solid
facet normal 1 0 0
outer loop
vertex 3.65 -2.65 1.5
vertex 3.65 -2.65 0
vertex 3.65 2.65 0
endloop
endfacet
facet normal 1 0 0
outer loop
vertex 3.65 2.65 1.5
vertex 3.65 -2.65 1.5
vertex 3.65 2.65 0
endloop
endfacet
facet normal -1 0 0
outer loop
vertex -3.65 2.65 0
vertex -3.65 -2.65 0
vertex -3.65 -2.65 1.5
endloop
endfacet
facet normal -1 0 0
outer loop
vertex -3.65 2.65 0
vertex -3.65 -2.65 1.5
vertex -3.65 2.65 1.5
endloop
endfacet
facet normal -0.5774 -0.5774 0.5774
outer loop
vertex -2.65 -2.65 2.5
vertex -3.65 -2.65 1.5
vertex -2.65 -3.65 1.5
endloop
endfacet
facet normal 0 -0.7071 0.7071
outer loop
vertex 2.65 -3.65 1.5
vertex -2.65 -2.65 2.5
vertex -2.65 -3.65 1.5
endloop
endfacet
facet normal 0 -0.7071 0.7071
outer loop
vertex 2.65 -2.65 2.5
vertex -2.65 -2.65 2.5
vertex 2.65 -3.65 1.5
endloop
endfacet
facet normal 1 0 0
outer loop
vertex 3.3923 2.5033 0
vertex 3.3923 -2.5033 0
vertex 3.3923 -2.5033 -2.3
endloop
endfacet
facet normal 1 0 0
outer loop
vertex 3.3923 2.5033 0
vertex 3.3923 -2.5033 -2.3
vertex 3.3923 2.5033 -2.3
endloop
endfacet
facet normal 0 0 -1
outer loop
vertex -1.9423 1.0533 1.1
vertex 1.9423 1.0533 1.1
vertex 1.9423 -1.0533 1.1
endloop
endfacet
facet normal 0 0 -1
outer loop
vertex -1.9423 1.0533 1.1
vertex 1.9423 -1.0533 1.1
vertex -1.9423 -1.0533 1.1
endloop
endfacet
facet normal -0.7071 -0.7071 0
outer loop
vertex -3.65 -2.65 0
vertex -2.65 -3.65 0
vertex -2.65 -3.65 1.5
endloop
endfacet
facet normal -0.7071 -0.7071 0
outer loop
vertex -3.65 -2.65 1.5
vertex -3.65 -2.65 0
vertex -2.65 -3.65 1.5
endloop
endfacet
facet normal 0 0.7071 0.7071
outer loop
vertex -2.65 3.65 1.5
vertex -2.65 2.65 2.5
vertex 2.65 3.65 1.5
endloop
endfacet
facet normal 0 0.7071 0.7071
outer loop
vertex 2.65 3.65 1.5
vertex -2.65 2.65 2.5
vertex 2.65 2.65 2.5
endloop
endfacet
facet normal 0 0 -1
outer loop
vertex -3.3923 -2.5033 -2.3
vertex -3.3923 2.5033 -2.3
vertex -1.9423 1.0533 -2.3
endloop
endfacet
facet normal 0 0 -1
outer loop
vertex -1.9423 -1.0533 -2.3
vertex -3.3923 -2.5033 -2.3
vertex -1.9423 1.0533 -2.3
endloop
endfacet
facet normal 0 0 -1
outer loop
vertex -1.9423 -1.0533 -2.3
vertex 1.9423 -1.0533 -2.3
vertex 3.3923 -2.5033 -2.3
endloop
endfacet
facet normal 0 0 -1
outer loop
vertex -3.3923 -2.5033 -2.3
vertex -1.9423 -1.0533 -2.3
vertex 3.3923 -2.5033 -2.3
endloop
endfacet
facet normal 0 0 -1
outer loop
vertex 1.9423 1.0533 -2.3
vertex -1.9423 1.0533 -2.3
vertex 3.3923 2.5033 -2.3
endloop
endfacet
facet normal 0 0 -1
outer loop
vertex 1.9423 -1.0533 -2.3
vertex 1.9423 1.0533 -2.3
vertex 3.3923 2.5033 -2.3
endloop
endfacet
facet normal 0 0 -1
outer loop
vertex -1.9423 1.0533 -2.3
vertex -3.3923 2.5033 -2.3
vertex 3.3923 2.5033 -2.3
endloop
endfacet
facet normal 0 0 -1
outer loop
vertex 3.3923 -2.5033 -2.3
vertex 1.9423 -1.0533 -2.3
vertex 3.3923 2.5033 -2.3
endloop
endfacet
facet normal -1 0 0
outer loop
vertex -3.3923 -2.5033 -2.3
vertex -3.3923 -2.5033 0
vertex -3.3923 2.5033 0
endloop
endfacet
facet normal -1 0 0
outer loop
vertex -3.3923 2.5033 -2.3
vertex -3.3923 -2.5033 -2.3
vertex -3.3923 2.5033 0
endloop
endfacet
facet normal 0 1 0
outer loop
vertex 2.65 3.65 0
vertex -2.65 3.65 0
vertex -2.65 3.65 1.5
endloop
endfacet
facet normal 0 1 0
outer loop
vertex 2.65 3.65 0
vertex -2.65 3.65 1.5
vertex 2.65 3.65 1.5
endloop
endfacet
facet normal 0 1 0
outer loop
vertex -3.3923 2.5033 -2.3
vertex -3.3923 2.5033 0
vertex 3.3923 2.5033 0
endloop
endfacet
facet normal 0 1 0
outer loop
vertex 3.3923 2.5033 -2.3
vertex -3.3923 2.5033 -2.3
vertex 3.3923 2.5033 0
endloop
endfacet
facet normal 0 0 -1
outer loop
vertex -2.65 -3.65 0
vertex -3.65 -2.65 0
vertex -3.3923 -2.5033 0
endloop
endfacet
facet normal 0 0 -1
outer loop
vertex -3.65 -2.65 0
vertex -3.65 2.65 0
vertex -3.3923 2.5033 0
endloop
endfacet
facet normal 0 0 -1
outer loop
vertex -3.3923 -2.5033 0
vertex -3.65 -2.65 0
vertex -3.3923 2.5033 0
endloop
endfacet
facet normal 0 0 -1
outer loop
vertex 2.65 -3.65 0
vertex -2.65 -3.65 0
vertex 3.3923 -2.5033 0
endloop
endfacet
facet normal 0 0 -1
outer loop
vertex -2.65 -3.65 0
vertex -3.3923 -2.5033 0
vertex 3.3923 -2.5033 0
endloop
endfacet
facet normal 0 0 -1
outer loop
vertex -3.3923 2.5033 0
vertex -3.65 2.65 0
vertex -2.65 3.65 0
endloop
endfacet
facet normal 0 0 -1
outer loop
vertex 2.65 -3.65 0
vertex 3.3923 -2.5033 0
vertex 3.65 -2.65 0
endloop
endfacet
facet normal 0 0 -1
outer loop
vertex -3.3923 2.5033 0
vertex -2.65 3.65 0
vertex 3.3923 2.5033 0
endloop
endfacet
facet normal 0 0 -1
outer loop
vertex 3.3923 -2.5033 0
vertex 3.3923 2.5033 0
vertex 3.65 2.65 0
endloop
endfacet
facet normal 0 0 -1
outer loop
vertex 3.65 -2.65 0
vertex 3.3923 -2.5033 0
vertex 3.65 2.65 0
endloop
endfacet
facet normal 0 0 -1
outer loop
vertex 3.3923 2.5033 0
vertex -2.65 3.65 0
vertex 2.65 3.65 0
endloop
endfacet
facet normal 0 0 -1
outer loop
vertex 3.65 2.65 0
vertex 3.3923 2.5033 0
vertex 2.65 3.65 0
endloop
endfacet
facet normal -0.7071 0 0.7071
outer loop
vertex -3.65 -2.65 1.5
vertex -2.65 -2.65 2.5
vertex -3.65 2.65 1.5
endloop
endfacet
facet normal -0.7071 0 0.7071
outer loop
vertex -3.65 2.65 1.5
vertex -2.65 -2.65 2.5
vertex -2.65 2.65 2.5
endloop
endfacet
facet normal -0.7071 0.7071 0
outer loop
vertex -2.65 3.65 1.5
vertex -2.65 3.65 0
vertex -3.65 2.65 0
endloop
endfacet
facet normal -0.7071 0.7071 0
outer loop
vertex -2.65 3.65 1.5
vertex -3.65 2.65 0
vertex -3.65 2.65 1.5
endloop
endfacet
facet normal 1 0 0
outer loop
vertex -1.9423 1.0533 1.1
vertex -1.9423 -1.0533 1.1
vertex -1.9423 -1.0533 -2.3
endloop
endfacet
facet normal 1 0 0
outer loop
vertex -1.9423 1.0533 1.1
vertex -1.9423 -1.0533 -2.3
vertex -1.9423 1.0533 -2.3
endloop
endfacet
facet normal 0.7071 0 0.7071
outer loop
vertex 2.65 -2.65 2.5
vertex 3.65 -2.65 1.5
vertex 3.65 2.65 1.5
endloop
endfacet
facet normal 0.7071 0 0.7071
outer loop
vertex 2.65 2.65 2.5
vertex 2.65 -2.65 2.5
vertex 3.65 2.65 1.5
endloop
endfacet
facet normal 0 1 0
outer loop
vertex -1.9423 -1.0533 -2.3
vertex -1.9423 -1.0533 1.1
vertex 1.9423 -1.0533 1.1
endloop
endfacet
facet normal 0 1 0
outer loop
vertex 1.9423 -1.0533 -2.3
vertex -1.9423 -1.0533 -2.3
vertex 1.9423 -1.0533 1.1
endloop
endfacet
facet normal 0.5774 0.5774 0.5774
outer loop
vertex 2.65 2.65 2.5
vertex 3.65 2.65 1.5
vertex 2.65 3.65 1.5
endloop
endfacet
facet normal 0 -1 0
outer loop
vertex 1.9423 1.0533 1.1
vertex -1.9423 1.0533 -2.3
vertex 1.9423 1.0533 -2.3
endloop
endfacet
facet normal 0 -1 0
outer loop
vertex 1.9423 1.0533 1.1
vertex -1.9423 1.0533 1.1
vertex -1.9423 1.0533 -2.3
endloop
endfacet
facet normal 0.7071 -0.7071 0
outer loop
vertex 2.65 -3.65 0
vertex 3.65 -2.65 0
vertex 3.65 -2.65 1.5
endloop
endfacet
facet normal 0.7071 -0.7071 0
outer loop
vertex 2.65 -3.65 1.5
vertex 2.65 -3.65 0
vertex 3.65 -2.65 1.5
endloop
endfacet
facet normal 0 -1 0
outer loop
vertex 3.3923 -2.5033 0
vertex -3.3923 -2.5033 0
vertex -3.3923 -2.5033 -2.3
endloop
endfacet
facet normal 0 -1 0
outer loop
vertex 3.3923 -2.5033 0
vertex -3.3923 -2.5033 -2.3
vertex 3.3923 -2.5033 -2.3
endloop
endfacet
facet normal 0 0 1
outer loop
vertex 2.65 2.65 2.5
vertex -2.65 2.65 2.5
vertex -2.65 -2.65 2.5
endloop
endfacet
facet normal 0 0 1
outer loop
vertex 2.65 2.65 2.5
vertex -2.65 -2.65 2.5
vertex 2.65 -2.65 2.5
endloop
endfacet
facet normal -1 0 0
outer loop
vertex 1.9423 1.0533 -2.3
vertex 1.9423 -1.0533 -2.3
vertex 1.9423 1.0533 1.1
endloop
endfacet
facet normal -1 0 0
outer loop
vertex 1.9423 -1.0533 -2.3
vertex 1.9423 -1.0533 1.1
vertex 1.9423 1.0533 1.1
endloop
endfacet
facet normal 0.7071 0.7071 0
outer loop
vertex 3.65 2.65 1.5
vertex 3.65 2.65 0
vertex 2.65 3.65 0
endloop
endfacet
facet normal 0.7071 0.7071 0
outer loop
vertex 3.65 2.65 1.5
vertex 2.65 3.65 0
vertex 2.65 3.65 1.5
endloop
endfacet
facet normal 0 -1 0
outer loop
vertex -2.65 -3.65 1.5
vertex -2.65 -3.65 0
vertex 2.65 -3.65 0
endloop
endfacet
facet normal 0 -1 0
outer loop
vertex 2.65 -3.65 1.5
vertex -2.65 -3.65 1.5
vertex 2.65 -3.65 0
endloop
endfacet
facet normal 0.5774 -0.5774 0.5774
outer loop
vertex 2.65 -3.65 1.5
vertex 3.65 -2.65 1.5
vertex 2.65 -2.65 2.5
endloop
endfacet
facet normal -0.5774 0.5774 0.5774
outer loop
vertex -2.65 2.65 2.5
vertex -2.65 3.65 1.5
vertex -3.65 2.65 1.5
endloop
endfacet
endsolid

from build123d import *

# Parameters (mm, degrees)
SKETCH1_W           = 6.7846
SKETCH1_H           = 5.0066
SKETCH1_W_2         = 3.8846
SKETCH1_H_2         = 2.1066
BOSS_EXTRUDE1_DEPTH = 2.3
SKETCH2_W           = 7.3
SKETCH2_H           = 7.3
BOSS_EXTRUDE2_DEPTH = 2.5
CHAMFER1_SIZE       = 1
SKETCH3_W           = 3.8846
SKETCH3_H           = 2.1066
CUT_EXTRUDE1_DEPTH  = 1.1


with BuildPart() as part:
    # Sketch1 → Boss-Extrude1 (new body)
    with BuildSketch(Plane.XY):
        Rectangle(SKETCH1_W, SKETCH1_H)
        Rectangle(SKETCH1_W_2, SKETCH1_H_2, mode=Mode.SUBTRACT)
    extrude(amount=-BOSS_EXTRUDE1_DEPTH)

    # Sketch2 → Boss-Extrude2 (add)
    with BuildSketch(Plane.XY):
        Rectangle(SKETCH2_W, SKETCH2_H)
    extrude(amount=BOSS_EXTRUDE2_DEPTH)

    # Chamfer1
    chamfer1_edges = [part.edges().sort_by_distance(p)[0] for p in [
        (3.65, -3.65, 1.25),
        (3.65, 3.65, 1.25),
        (-3.65, 3.65, 1.25),
        (-3.65, -3.65, 1.25),
        (3.65, 0, 2.5),
        (0, 3.65, 2.5),
        (-3.65, 0, 2.5),
        (0, -3.65, 2.5),
    ]]
    chamfer(chamfer1_edges, length=CHAMFER1_SIZE)

    # Sketch3 → Cut-Extrude1 (cut)
    with BuildSketch(Plane(origin=(0, 0, 0), x_dir=(-1, 0, 0), z_dir=(0, 0, -1))):
        Rectangle(SKETCH3_W, SKETCH3_H)
    extrude(amount=-CUT_EXTRUDE1_DEPTH, mode=Mode.SUBTRACT)


solid = part.part
